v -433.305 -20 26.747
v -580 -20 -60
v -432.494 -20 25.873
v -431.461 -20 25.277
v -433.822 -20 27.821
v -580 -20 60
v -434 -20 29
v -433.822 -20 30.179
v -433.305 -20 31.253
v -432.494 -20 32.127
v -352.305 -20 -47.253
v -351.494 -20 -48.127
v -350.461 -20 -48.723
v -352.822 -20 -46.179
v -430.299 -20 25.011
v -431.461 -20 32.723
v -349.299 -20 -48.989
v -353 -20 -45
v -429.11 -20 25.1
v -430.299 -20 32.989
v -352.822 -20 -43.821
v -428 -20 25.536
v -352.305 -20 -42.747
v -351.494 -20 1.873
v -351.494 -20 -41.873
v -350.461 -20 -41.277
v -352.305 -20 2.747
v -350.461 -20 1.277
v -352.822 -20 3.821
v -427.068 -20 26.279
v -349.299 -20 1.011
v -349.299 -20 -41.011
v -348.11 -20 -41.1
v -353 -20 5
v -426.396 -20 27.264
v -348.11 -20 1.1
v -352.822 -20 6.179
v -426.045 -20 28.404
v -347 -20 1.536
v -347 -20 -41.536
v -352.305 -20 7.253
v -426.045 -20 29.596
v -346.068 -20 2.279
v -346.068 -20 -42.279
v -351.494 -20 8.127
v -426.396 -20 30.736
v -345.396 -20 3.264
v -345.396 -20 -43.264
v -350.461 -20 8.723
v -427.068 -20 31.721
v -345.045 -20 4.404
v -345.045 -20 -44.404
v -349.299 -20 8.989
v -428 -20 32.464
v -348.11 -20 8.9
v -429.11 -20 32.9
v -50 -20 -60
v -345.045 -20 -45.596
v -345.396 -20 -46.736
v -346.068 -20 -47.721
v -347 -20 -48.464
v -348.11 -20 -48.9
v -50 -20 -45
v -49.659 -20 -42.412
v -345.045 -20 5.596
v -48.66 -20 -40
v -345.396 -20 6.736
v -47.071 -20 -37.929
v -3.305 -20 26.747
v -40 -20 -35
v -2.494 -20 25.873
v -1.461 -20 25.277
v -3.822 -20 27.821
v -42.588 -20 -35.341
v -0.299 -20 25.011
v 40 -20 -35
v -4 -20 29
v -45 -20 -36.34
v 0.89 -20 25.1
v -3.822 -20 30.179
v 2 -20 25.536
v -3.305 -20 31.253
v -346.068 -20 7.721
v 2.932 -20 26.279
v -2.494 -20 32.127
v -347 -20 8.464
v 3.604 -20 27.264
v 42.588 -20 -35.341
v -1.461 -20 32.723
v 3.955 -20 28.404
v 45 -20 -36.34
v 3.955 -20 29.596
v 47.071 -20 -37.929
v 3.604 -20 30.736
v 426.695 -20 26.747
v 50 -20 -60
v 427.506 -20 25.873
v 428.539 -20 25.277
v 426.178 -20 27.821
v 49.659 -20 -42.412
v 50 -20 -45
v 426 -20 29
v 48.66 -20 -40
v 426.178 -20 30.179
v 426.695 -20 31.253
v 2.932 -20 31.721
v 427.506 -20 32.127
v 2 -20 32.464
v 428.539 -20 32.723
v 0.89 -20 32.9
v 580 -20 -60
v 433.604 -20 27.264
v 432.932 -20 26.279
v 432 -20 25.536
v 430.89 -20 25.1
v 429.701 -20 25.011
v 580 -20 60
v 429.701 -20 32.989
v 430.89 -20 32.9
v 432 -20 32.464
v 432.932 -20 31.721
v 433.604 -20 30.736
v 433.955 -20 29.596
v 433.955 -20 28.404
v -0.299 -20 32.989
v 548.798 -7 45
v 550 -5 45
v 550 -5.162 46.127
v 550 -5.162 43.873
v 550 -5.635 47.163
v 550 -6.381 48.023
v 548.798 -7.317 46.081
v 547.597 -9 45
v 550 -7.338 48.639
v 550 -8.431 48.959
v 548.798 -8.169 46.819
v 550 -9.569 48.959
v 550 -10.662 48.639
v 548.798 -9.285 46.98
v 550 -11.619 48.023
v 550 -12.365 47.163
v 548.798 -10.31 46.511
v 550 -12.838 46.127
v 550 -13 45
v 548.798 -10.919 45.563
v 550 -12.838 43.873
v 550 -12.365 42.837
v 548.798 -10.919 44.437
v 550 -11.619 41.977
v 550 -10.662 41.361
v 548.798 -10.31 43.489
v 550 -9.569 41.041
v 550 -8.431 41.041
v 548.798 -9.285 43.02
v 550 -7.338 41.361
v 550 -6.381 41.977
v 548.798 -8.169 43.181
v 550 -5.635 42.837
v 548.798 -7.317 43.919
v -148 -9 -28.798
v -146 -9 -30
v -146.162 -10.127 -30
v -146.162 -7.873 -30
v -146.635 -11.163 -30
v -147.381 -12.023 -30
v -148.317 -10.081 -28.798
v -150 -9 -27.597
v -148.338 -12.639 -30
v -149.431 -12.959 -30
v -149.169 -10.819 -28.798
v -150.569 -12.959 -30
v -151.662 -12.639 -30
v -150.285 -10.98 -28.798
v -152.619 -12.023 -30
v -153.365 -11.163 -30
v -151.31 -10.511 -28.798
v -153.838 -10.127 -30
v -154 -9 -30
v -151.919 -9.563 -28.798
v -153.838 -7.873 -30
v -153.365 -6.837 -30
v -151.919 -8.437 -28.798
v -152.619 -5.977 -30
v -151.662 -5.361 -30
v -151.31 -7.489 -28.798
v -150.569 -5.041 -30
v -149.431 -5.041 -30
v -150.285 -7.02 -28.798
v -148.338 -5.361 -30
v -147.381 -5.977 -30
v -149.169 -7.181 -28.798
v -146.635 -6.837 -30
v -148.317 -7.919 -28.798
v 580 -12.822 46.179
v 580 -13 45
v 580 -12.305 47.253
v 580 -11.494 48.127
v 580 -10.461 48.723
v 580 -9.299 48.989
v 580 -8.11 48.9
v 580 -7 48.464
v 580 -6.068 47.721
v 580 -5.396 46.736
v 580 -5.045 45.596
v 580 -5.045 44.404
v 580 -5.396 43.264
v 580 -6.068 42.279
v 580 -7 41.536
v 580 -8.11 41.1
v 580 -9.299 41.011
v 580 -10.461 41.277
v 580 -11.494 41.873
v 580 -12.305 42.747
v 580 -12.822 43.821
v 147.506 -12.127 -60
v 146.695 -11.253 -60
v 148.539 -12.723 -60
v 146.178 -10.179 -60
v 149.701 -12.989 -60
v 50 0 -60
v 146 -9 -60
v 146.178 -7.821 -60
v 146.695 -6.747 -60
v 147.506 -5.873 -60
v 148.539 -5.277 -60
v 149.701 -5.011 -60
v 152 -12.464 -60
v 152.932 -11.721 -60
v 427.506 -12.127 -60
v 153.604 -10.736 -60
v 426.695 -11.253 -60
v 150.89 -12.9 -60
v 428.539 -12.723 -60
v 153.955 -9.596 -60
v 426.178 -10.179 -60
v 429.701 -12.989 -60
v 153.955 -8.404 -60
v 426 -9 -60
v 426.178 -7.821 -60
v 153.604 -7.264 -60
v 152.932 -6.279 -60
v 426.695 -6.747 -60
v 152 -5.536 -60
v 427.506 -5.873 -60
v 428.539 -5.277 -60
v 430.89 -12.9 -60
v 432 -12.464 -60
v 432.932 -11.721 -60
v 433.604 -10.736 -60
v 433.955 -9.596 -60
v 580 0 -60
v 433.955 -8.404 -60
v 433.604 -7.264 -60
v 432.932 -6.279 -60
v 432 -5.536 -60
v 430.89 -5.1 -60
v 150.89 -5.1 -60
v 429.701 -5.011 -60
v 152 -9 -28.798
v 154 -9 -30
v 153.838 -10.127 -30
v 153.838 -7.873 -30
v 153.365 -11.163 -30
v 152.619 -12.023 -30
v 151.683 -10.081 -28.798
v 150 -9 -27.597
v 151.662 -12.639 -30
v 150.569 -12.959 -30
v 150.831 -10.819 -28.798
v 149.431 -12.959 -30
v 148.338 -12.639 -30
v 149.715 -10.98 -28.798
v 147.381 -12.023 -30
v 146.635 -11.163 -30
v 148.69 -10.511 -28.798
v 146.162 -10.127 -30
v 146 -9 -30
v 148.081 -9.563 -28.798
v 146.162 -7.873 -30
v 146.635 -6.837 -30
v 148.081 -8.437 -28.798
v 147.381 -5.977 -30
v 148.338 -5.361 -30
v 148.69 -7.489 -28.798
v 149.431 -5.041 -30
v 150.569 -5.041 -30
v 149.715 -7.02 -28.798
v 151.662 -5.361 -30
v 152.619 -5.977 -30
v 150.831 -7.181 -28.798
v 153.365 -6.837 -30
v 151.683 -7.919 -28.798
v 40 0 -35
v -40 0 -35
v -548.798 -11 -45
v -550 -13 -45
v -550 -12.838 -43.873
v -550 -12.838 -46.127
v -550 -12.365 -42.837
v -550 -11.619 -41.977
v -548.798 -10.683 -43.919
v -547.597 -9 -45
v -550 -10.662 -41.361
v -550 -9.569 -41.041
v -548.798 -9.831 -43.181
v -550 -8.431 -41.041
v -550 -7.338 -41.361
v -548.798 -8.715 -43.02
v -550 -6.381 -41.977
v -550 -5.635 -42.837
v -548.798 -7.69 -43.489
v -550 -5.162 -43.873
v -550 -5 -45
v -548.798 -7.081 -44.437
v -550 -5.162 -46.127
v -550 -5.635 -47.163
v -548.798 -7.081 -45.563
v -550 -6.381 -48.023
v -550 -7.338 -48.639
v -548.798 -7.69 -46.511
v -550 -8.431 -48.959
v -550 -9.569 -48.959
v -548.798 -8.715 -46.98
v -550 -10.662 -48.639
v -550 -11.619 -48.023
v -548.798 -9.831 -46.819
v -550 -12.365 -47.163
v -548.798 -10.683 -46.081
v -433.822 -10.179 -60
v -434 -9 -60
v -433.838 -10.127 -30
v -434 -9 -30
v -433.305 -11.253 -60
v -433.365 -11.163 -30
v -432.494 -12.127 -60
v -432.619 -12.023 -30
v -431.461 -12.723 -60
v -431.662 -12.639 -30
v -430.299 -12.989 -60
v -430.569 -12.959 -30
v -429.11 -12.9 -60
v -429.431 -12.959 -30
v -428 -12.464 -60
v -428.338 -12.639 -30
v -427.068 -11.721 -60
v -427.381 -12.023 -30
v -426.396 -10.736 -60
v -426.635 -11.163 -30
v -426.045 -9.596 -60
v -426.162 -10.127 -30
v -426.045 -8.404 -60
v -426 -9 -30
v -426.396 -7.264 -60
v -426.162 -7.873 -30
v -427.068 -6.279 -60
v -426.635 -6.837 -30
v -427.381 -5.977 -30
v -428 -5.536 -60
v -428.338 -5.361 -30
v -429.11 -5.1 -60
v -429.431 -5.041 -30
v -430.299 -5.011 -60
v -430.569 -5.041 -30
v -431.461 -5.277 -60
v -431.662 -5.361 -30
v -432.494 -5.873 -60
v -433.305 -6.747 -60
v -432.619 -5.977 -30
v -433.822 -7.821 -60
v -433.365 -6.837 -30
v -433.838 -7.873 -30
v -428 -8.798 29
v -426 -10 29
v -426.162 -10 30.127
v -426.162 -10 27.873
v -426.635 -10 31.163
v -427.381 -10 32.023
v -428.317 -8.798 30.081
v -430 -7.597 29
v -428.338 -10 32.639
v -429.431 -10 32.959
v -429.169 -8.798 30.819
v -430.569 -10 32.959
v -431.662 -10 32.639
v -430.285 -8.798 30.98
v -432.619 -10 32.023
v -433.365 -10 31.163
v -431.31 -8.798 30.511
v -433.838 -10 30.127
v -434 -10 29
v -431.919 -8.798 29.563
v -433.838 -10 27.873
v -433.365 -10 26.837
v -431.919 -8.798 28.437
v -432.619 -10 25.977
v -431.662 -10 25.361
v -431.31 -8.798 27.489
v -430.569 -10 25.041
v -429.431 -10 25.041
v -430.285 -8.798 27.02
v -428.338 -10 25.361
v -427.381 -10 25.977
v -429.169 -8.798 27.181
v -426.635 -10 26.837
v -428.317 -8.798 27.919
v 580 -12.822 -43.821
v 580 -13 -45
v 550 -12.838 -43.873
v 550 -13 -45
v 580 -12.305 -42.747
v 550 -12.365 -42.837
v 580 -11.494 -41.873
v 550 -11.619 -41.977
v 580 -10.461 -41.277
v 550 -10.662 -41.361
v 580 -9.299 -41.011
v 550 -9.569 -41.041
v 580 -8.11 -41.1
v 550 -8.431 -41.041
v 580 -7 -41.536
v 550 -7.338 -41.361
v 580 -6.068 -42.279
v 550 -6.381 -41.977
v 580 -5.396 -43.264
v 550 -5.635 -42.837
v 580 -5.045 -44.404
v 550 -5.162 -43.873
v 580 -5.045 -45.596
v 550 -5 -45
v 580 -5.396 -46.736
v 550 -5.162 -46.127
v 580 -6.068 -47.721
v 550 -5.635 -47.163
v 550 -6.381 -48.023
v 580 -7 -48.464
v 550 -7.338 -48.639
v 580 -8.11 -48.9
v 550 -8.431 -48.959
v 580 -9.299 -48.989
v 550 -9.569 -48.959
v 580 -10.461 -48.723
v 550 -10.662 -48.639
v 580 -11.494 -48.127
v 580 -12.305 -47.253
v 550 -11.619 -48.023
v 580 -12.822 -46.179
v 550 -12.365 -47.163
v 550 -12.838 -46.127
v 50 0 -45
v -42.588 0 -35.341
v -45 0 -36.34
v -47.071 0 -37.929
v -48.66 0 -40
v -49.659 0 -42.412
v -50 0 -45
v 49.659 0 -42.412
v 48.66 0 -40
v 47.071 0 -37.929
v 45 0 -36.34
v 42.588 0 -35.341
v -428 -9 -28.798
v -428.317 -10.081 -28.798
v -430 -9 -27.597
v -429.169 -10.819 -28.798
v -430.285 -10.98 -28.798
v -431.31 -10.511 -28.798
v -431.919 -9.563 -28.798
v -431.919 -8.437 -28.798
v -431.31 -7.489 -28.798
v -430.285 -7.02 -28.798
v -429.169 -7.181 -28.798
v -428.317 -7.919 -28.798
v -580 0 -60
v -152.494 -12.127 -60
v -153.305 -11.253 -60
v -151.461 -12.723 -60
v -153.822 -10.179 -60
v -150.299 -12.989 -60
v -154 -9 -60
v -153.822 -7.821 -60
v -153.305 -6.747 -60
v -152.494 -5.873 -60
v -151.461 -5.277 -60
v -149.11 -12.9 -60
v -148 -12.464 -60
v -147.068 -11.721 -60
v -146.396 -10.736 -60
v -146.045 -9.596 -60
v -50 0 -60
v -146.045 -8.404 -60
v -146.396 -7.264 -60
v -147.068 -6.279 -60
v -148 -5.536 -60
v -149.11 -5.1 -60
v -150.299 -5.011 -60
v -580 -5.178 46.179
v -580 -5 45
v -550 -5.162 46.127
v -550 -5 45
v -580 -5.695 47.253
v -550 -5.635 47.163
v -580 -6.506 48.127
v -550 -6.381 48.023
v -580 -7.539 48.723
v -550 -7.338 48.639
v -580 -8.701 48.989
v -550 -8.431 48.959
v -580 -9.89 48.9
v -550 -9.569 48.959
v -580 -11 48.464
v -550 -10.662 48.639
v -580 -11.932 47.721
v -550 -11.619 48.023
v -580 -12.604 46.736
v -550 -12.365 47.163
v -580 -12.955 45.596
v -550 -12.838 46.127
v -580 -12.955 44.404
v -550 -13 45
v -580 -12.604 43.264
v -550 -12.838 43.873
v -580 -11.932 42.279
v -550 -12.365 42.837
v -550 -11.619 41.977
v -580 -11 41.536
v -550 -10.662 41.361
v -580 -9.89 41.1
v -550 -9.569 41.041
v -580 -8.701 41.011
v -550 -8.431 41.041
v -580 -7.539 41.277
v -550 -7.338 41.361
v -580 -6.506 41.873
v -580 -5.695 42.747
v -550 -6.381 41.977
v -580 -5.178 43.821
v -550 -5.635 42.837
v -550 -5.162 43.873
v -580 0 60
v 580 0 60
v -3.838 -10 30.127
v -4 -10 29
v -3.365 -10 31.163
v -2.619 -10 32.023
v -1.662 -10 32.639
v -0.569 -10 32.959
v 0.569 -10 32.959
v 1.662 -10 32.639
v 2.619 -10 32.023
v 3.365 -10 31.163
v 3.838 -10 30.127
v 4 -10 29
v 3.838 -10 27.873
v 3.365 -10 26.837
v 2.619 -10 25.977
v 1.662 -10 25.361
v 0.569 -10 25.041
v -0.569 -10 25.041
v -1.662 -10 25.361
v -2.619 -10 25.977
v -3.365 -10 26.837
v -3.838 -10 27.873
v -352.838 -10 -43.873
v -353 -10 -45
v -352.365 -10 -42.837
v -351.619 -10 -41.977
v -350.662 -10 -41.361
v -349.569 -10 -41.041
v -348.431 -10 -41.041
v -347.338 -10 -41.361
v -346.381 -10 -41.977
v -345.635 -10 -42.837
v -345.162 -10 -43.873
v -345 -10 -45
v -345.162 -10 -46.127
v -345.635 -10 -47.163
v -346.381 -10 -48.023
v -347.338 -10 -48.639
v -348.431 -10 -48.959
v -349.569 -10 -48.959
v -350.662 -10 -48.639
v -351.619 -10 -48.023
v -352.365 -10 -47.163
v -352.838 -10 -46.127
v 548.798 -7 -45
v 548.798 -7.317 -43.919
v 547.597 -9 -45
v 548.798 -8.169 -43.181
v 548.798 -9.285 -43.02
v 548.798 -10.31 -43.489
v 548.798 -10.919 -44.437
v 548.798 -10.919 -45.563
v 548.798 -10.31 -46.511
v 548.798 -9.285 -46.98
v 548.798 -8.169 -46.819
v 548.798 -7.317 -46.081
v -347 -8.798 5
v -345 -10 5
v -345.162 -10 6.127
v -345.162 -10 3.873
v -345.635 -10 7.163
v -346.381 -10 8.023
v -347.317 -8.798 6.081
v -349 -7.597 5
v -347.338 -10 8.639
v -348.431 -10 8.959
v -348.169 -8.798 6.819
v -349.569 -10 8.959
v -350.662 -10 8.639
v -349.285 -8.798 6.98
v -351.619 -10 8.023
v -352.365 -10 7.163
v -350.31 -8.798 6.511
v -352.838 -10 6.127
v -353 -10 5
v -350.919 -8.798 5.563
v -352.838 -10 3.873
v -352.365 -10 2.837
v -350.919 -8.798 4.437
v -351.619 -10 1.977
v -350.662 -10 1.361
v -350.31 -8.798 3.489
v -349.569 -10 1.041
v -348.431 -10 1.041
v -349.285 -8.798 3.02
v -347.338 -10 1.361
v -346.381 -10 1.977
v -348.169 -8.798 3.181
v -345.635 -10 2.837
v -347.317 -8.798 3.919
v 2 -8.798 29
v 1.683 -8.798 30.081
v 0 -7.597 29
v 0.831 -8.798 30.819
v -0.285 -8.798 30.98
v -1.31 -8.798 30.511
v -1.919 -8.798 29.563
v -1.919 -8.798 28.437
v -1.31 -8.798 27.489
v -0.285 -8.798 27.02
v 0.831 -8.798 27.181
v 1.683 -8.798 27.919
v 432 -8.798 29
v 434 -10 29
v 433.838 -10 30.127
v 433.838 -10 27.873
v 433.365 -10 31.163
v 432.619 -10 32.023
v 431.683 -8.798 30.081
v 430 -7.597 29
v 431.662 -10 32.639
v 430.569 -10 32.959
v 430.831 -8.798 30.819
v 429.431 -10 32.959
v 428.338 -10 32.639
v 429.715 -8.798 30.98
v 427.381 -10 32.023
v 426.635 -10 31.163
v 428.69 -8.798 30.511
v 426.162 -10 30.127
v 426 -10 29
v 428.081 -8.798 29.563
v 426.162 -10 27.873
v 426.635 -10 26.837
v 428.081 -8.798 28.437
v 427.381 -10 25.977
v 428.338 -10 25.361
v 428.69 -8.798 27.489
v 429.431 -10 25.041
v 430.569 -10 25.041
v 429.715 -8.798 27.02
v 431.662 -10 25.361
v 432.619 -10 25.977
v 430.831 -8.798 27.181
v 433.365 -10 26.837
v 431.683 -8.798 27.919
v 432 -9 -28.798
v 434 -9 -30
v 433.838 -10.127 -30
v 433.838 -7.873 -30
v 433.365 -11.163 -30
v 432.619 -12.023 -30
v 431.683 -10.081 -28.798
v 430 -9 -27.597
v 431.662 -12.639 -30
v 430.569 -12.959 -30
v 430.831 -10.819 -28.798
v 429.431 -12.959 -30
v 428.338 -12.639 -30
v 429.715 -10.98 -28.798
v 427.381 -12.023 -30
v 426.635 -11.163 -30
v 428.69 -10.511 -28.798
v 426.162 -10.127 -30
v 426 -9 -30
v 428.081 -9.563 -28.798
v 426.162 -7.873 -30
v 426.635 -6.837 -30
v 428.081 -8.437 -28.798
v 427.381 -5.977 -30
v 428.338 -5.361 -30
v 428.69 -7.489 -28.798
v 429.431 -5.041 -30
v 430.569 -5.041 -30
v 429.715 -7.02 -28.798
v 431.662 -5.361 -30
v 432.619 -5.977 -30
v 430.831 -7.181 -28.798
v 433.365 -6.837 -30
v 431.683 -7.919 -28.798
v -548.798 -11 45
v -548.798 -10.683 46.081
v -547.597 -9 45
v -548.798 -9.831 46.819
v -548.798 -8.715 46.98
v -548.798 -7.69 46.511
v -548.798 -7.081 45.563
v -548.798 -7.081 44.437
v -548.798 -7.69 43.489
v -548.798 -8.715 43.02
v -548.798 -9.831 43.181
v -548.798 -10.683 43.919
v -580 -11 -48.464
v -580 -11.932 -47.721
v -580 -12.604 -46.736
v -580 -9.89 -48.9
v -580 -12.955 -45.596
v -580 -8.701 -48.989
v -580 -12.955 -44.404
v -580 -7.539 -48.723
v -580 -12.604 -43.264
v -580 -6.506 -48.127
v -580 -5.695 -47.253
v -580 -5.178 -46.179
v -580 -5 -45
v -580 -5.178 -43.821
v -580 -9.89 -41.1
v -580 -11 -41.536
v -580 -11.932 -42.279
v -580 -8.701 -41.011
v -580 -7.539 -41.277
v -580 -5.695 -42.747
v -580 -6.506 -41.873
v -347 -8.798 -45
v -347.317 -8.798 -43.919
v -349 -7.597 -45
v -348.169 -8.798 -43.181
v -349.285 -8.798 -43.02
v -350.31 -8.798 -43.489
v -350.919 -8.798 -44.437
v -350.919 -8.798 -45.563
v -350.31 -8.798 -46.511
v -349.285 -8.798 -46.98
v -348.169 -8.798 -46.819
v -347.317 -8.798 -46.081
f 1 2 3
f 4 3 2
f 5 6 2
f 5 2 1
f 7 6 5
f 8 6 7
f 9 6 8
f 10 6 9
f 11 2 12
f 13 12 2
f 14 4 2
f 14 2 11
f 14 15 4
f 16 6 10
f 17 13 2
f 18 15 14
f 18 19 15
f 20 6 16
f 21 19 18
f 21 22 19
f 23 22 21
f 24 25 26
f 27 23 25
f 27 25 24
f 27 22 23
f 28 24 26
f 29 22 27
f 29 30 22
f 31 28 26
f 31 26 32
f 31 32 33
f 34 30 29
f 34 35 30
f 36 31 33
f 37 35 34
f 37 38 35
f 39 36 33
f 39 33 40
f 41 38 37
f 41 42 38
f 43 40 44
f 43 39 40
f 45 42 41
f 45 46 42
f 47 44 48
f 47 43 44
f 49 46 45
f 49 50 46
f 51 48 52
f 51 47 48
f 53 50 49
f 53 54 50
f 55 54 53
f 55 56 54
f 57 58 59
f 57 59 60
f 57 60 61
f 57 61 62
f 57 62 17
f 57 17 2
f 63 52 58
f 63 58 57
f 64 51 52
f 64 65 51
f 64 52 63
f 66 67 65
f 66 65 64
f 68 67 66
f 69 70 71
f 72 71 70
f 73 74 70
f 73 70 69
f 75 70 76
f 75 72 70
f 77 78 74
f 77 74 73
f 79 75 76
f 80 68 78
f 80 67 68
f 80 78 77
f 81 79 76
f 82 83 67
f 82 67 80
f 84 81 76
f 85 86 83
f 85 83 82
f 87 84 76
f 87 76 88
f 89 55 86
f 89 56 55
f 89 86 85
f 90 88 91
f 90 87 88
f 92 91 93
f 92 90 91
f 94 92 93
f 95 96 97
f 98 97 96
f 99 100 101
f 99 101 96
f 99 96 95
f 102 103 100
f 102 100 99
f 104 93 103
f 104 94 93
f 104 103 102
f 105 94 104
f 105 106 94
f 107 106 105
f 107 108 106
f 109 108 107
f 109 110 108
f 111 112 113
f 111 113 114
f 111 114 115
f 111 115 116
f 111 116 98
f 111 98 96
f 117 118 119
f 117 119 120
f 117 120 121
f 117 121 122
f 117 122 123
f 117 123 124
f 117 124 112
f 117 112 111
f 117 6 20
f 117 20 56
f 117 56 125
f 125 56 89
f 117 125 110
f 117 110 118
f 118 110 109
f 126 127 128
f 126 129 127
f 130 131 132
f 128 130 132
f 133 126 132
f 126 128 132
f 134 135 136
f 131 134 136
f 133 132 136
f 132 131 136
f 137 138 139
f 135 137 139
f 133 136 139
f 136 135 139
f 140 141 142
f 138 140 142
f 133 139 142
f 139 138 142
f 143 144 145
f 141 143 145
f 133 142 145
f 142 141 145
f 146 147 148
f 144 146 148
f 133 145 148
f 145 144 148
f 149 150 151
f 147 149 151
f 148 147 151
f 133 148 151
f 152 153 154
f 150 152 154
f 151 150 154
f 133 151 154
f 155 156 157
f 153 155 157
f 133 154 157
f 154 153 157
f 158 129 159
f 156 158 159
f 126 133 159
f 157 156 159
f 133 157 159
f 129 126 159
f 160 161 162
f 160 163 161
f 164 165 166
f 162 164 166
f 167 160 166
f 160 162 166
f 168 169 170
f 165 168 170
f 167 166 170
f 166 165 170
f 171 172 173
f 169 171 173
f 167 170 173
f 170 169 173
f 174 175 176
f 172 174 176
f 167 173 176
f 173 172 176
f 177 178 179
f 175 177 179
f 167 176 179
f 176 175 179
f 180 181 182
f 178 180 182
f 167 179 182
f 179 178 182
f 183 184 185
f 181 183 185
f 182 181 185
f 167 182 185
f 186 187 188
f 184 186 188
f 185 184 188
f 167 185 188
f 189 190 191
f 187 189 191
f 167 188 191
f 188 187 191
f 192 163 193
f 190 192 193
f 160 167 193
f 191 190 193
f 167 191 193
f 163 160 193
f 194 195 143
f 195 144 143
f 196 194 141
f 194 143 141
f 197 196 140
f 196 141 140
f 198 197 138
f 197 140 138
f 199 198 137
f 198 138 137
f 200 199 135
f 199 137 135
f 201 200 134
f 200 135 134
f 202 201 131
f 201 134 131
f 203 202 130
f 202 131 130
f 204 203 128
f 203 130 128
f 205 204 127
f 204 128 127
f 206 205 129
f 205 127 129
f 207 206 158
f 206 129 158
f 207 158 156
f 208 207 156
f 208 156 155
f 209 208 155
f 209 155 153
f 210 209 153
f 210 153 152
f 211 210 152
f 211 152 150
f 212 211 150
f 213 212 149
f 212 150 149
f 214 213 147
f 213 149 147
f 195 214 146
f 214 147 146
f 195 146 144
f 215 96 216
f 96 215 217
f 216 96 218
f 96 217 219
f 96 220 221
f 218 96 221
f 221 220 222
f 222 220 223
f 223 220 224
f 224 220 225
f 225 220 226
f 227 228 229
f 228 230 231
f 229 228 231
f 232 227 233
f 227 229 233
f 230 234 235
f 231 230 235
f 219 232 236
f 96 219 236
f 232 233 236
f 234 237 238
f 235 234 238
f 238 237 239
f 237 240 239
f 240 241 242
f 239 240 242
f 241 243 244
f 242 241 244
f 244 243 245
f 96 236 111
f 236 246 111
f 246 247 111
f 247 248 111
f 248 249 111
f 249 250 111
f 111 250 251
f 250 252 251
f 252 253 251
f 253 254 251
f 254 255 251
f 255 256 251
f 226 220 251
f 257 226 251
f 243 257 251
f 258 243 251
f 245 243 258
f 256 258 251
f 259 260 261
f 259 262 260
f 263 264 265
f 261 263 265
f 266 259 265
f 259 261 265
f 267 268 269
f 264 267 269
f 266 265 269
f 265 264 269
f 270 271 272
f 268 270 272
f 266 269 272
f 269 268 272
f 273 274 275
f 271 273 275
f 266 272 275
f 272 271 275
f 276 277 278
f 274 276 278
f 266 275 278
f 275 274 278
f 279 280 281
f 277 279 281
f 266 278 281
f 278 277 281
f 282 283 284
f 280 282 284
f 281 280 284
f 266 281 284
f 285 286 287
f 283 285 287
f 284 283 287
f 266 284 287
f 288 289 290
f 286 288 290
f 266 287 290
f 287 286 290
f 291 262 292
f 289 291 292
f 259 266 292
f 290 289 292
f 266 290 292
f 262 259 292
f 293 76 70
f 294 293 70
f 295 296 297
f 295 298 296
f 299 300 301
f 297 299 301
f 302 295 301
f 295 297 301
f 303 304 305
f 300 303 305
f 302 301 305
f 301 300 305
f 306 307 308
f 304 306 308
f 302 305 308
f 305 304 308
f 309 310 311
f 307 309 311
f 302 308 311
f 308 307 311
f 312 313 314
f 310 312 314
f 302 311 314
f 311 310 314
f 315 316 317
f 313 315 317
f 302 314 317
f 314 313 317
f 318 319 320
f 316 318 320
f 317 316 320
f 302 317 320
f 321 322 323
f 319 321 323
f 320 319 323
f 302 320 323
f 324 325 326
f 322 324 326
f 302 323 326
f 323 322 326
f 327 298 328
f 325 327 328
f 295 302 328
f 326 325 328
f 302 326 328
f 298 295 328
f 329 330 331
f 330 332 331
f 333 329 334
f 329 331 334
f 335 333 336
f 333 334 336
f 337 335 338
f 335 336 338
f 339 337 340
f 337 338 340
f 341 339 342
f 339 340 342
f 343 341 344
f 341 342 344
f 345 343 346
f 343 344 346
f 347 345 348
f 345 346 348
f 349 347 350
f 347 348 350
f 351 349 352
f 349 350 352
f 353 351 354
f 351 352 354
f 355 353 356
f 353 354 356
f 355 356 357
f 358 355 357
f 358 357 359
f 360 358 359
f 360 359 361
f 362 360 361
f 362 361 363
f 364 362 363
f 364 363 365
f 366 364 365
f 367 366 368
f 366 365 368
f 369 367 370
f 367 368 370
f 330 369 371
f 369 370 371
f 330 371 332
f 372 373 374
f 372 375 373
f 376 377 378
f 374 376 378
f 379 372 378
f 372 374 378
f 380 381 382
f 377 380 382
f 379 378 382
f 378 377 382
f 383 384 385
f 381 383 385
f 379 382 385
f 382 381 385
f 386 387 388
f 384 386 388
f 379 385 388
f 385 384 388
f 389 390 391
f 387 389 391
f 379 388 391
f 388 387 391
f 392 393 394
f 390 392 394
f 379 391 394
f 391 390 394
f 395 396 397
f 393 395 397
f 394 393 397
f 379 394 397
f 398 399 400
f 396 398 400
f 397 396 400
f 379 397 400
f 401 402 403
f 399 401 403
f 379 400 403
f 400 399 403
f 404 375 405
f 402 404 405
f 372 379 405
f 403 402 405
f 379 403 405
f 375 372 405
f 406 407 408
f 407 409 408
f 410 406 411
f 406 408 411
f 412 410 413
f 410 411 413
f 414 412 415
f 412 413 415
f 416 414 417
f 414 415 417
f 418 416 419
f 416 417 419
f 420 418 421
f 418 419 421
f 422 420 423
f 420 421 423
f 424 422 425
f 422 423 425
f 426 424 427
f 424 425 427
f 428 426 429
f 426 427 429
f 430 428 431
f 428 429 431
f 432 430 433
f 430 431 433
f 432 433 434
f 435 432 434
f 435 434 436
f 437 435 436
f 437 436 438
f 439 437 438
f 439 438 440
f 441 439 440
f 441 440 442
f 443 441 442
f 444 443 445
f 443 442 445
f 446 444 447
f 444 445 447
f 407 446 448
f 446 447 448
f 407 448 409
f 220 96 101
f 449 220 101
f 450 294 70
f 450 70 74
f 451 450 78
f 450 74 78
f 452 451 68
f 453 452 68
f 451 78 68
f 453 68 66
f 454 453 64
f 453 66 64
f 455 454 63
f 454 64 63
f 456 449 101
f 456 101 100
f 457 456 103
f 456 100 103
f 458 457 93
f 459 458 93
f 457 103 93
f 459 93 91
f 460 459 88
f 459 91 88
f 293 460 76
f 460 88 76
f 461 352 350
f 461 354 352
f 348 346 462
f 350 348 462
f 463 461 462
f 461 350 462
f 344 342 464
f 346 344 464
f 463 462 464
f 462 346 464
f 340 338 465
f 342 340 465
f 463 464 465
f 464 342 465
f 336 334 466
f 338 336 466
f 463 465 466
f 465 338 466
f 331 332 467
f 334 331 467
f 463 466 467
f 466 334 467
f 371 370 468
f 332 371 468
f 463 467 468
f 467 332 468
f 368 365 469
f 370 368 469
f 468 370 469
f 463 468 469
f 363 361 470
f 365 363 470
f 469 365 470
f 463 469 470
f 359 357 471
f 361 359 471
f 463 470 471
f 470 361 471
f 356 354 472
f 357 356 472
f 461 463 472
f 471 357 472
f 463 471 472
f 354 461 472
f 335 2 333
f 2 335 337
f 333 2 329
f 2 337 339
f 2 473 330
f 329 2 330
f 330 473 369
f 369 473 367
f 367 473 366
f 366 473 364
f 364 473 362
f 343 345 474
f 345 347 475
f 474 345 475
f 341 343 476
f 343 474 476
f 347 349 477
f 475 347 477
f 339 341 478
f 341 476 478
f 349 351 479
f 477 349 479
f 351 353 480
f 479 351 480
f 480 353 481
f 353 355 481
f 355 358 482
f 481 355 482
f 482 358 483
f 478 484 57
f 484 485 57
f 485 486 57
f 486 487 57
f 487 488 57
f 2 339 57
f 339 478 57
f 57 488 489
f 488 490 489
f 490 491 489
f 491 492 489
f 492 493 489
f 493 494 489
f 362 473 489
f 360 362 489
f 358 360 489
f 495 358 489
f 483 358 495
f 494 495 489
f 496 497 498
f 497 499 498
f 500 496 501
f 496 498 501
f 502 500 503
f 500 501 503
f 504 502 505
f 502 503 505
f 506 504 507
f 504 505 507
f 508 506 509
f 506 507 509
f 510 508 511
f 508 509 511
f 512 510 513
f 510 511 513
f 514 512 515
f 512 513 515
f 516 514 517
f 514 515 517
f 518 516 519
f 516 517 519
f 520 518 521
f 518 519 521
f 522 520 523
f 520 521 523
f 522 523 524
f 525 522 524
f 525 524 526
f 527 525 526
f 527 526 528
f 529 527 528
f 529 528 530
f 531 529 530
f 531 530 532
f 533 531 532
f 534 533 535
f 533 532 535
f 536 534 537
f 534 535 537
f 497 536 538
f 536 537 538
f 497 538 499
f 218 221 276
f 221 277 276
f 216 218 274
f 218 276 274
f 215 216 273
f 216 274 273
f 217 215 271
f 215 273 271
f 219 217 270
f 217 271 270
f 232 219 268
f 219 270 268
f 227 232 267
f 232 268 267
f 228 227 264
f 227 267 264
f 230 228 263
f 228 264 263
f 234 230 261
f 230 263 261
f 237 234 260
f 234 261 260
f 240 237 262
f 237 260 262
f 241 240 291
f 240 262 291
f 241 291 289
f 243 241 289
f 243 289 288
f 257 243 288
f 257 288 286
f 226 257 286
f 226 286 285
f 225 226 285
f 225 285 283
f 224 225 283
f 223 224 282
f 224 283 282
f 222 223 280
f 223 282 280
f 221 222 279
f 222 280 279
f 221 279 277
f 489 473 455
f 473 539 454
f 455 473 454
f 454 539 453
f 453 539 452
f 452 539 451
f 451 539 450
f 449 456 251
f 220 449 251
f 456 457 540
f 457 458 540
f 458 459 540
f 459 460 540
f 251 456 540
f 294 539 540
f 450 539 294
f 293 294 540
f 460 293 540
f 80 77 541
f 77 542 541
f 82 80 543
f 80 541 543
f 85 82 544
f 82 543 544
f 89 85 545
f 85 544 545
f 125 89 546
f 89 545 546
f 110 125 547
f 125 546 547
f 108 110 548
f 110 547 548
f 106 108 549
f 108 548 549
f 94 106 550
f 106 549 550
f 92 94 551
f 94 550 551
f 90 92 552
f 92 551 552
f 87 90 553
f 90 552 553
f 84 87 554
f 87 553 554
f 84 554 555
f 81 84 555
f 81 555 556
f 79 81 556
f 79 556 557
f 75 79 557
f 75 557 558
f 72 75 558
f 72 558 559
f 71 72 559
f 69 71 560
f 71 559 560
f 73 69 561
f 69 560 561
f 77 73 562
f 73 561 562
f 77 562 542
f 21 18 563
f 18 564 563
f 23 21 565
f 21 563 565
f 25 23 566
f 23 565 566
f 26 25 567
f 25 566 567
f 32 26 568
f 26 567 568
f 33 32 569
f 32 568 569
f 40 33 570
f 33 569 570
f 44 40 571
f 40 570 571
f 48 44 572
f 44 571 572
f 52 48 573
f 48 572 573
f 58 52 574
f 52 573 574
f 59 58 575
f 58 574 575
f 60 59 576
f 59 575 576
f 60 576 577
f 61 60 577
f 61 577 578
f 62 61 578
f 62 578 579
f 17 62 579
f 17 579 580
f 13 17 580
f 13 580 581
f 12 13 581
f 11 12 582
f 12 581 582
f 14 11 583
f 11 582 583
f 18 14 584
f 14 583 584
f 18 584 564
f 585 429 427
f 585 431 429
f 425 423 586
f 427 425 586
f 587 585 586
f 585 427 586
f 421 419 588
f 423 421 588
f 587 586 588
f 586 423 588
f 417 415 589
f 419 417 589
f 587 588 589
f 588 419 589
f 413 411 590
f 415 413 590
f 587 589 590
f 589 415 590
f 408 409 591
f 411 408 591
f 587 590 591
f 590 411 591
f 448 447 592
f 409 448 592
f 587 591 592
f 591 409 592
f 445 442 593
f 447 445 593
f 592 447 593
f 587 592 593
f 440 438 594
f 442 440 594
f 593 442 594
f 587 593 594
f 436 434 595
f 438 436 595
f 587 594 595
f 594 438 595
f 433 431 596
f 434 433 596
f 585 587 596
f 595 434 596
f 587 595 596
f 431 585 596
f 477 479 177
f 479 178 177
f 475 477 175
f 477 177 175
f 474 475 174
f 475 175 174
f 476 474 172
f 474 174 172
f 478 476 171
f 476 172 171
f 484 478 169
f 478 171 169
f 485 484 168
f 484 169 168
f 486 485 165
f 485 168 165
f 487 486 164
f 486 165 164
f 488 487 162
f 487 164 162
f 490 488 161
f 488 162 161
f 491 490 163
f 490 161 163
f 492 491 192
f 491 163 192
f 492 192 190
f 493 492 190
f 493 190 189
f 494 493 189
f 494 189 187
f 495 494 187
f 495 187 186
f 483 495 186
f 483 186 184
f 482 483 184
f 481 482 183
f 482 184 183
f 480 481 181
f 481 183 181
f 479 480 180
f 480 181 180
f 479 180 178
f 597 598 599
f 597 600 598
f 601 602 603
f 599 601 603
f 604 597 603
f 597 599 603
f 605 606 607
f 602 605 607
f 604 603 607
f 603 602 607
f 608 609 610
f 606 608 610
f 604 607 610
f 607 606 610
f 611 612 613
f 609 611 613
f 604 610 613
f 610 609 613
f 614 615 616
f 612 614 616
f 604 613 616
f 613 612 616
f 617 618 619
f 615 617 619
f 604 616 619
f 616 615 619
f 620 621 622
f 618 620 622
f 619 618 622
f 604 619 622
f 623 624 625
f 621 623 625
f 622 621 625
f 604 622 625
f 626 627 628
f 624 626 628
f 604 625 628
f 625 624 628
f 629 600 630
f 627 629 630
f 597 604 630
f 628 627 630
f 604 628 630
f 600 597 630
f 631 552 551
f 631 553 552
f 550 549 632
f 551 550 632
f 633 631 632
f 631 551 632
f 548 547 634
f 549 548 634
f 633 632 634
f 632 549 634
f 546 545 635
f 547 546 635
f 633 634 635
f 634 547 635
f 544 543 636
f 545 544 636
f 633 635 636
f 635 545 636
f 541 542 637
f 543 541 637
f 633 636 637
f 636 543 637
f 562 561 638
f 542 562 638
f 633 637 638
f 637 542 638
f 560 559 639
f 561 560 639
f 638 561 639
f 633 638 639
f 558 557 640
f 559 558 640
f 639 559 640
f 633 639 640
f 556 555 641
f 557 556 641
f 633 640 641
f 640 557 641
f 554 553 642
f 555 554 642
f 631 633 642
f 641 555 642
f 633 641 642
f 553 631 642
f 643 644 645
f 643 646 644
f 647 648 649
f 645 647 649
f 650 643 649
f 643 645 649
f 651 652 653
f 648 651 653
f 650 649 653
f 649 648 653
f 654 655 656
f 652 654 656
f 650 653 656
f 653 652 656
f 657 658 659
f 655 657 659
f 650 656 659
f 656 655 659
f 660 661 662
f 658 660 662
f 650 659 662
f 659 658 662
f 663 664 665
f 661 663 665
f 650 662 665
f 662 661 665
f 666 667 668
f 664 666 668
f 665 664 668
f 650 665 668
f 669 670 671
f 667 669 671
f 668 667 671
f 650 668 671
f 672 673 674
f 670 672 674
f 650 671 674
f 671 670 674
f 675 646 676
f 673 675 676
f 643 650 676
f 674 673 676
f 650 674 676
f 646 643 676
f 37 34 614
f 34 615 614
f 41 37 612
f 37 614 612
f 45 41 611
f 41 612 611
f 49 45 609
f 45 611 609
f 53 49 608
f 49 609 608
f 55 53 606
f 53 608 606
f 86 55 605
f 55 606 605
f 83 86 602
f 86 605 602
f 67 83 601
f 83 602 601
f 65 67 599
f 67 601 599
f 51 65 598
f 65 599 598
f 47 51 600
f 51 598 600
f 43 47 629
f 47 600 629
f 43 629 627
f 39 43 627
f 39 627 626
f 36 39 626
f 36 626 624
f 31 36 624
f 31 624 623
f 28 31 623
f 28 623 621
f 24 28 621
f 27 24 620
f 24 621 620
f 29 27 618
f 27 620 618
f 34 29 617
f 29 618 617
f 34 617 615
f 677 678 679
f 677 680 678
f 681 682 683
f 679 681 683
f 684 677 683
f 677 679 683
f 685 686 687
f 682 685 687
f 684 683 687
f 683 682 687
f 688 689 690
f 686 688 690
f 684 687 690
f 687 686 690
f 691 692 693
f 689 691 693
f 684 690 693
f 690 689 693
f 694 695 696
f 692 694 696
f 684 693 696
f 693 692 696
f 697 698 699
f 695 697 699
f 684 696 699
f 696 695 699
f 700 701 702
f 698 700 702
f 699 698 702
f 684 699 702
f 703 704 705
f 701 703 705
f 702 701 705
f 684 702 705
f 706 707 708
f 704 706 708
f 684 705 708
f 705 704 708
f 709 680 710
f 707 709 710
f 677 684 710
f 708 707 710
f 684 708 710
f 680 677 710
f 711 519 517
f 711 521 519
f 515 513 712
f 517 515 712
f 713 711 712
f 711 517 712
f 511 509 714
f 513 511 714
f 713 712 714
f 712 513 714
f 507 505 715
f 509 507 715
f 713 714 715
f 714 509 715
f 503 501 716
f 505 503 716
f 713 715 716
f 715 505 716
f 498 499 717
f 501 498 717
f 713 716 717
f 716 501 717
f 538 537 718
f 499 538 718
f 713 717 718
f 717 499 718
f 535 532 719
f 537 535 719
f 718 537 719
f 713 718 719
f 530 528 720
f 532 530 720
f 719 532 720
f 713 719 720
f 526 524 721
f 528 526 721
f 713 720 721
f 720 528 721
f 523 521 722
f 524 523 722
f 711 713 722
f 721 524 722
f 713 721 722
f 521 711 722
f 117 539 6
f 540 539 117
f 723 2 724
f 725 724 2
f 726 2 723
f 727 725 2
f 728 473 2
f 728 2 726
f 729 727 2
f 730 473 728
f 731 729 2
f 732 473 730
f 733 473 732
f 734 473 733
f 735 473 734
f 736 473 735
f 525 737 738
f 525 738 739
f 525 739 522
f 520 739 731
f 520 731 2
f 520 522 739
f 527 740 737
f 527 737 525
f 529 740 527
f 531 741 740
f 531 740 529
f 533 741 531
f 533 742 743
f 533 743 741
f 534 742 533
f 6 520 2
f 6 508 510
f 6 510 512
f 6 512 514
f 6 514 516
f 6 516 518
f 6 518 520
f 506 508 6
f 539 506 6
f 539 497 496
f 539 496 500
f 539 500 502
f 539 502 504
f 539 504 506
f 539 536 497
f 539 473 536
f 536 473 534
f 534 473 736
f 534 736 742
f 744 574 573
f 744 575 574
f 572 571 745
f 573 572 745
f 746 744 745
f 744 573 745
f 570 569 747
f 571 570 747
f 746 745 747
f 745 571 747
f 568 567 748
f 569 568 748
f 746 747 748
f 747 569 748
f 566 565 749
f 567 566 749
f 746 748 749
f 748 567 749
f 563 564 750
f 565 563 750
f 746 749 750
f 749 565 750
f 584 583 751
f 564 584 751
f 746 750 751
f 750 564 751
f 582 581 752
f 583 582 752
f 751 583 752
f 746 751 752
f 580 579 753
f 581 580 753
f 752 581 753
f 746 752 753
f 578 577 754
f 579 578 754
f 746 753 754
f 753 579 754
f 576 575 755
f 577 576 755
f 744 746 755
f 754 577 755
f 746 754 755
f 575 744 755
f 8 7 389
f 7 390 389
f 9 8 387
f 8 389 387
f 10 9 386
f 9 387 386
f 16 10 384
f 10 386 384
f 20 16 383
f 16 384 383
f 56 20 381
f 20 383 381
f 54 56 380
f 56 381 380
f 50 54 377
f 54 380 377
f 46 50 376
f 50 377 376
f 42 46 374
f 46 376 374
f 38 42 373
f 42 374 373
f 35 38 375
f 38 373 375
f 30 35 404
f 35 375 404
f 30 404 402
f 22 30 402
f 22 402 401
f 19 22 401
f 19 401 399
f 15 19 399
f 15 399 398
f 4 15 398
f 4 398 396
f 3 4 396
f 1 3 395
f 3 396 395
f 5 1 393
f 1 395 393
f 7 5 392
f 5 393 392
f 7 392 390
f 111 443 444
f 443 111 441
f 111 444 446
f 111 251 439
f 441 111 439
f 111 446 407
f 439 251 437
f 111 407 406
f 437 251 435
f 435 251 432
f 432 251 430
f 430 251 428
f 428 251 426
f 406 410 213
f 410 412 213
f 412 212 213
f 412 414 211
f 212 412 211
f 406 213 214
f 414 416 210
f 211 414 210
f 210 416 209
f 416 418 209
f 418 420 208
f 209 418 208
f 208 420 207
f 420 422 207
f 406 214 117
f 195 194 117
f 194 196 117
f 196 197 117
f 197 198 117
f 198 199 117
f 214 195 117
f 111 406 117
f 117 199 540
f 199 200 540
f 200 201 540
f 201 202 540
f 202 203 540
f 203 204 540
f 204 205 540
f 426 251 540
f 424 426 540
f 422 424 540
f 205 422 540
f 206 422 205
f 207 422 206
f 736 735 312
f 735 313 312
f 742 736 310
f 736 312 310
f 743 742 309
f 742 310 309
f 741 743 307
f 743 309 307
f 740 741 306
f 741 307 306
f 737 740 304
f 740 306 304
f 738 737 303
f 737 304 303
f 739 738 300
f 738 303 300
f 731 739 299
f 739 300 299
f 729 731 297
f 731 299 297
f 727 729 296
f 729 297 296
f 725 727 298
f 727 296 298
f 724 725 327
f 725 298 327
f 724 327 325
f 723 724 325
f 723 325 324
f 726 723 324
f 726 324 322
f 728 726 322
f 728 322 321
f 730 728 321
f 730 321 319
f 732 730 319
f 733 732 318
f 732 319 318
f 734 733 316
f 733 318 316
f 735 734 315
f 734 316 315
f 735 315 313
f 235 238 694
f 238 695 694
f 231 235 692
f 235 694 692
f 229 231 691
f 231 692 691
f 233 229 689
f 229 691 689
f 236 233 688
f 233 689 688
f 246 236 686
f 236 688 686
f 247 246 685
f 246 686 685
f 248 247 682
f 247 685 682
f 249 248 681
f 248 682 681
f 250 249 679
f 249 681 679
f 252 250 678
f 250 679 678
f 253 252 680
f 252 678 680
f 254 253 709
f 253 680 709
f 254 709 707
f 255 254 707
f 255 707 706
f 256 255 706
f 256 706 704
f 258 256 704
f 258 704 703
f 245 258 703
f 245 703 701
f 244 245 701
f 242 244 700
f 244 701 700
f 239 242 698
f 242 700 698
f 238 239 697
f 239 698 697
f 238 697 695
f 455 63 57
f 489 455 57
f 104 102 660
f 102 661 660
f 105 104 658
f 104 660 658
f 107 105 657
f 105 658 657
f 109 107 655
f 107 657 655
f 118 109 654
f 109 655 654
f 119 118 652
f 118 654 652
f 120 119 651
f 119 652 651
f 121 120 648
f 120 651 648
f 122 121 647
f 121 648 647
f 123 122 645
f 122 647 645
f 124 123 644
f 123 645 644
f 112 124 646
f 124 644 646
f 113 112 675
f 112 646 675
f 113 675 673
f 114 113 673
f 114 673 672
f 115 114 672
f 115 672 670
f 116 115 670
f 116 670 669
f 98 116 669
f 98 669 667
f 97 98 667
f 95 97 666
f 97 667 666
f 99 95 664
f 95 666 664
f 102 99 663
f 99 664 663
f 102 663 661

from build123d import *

# Parameters (mm, degrees)
F0_W           = 1160
F0_H           = 120
F1_DEPTH       = 20
F3_DEPTH       = 20.001
F8_D           = 8
F8_DEPTH       = 30
F8_TIP         = 2.4034424761
F8_ON_F5_D     = 8
F8_ON_F5_DEPTH = 30
F8_ON_F5_TIP   = 2.4034424761
F8_ON_F7_D     = 8
F8_ON_F7_DEPTH = 30
F8_ON_F7_TIP   = 2.4034424761
F9_D           = 8
F9_DEPTH       = 10
F9_TIP         = 2.4034424761


with BuildPart() as f1:
    # F0 (on Front) → F1 (new body)
    with BuildSketch(Plane.XZ):
        Rectangle(F0_W, F0_H)
    extrude(amount=F1_DEPTH)

    # F2 (on face) → F3 (cut, through all)
    with BuildSketch(Plane.XZ.offset(20)):
        with BuildLine():
            Line((-50, -45), (-50, -60))
            Line((-50, -60), (50, -60))
            Line((50, -60), (50, -45))
            ThreePointArc((50, -45), (47.0710678119, -37.9289321881), (40, -35))
            Line((40, -35), (-40, -35))
            ThreePointArc((-40, -35), (-47.0710678119, -37.9289321881), (-50, -45))
        make_face()
    extrude(amount=-F3_DEPTH, mode=Mode.SUBTRACT)

    # F8
    with Locations(Plane(origin=(-580, 0, 0), x_dir=(0, -1, 0), z_dir=(-1, 0, 0))):
        with Locations((9, 45), (9, -45)):
            Hole(F8_D / 2, depth=F8_DEPTH)
            with Locations((0, 0, -(F8_DEPTH + F8_TIP / 2))):  # 118° drill point
                Cone(0, F8_D / 2, F8_TIP, mode=Mode.SUBTRACT)

    # F8 on F5
    with Locations(Plane.YZ.offset(580)):
        with Locations((-9, 45), (-9, -45)):
            Hole(F8_ON_F5_D / 2, depth=F8_ON_F5_DEPTH)
            with Locations((0, 0, -(F8_ON_F5_DEPTH + F8_ON_F5_TIP / 2))):  # 118° drill point
                Cone(0, F8_ON_F5_D / 2, F8_ON_F5_TIP, mode=Mode.SUBTRACT)

    # F8 on F7
    with Locations(Plane(origin=(0, 0, -60), x_dir=(1, 0, 0), z_dir=(0, 0, -1))):
        with Locations((-430, 9), (-150, 9), (150, 9), (430, 9)):
            Hole(F8_ON_F7_D / 2, depth=F8_ON_F7_DEPTH)
            with Locations((0, 0, -(F8_ON_F7_DEPTH + F8_ON_F7_TIP / 2))):  # 118° drill point
                Cone(0, F8_ON_F7_D / 2, F8_ON_F7_TIP, mode=Mode.SUBTRACT)

    # F9
    with Locations(Plane.XZ.offset(20)):
        with Locations((430, 29), (0, 29), (-430, 29), (-349, -45), (-349, 5)):
            Hole(F9_D / 2, depth=F9_DEPTH)
            with Locations((0, 0, -(F9_DEPTH + F9_TIP / 2))):  # 118° drill point
                Cone(0, F9_D / 2, F9_TIP, mode=Mode.SUBTRACT)


solid = f1.part
